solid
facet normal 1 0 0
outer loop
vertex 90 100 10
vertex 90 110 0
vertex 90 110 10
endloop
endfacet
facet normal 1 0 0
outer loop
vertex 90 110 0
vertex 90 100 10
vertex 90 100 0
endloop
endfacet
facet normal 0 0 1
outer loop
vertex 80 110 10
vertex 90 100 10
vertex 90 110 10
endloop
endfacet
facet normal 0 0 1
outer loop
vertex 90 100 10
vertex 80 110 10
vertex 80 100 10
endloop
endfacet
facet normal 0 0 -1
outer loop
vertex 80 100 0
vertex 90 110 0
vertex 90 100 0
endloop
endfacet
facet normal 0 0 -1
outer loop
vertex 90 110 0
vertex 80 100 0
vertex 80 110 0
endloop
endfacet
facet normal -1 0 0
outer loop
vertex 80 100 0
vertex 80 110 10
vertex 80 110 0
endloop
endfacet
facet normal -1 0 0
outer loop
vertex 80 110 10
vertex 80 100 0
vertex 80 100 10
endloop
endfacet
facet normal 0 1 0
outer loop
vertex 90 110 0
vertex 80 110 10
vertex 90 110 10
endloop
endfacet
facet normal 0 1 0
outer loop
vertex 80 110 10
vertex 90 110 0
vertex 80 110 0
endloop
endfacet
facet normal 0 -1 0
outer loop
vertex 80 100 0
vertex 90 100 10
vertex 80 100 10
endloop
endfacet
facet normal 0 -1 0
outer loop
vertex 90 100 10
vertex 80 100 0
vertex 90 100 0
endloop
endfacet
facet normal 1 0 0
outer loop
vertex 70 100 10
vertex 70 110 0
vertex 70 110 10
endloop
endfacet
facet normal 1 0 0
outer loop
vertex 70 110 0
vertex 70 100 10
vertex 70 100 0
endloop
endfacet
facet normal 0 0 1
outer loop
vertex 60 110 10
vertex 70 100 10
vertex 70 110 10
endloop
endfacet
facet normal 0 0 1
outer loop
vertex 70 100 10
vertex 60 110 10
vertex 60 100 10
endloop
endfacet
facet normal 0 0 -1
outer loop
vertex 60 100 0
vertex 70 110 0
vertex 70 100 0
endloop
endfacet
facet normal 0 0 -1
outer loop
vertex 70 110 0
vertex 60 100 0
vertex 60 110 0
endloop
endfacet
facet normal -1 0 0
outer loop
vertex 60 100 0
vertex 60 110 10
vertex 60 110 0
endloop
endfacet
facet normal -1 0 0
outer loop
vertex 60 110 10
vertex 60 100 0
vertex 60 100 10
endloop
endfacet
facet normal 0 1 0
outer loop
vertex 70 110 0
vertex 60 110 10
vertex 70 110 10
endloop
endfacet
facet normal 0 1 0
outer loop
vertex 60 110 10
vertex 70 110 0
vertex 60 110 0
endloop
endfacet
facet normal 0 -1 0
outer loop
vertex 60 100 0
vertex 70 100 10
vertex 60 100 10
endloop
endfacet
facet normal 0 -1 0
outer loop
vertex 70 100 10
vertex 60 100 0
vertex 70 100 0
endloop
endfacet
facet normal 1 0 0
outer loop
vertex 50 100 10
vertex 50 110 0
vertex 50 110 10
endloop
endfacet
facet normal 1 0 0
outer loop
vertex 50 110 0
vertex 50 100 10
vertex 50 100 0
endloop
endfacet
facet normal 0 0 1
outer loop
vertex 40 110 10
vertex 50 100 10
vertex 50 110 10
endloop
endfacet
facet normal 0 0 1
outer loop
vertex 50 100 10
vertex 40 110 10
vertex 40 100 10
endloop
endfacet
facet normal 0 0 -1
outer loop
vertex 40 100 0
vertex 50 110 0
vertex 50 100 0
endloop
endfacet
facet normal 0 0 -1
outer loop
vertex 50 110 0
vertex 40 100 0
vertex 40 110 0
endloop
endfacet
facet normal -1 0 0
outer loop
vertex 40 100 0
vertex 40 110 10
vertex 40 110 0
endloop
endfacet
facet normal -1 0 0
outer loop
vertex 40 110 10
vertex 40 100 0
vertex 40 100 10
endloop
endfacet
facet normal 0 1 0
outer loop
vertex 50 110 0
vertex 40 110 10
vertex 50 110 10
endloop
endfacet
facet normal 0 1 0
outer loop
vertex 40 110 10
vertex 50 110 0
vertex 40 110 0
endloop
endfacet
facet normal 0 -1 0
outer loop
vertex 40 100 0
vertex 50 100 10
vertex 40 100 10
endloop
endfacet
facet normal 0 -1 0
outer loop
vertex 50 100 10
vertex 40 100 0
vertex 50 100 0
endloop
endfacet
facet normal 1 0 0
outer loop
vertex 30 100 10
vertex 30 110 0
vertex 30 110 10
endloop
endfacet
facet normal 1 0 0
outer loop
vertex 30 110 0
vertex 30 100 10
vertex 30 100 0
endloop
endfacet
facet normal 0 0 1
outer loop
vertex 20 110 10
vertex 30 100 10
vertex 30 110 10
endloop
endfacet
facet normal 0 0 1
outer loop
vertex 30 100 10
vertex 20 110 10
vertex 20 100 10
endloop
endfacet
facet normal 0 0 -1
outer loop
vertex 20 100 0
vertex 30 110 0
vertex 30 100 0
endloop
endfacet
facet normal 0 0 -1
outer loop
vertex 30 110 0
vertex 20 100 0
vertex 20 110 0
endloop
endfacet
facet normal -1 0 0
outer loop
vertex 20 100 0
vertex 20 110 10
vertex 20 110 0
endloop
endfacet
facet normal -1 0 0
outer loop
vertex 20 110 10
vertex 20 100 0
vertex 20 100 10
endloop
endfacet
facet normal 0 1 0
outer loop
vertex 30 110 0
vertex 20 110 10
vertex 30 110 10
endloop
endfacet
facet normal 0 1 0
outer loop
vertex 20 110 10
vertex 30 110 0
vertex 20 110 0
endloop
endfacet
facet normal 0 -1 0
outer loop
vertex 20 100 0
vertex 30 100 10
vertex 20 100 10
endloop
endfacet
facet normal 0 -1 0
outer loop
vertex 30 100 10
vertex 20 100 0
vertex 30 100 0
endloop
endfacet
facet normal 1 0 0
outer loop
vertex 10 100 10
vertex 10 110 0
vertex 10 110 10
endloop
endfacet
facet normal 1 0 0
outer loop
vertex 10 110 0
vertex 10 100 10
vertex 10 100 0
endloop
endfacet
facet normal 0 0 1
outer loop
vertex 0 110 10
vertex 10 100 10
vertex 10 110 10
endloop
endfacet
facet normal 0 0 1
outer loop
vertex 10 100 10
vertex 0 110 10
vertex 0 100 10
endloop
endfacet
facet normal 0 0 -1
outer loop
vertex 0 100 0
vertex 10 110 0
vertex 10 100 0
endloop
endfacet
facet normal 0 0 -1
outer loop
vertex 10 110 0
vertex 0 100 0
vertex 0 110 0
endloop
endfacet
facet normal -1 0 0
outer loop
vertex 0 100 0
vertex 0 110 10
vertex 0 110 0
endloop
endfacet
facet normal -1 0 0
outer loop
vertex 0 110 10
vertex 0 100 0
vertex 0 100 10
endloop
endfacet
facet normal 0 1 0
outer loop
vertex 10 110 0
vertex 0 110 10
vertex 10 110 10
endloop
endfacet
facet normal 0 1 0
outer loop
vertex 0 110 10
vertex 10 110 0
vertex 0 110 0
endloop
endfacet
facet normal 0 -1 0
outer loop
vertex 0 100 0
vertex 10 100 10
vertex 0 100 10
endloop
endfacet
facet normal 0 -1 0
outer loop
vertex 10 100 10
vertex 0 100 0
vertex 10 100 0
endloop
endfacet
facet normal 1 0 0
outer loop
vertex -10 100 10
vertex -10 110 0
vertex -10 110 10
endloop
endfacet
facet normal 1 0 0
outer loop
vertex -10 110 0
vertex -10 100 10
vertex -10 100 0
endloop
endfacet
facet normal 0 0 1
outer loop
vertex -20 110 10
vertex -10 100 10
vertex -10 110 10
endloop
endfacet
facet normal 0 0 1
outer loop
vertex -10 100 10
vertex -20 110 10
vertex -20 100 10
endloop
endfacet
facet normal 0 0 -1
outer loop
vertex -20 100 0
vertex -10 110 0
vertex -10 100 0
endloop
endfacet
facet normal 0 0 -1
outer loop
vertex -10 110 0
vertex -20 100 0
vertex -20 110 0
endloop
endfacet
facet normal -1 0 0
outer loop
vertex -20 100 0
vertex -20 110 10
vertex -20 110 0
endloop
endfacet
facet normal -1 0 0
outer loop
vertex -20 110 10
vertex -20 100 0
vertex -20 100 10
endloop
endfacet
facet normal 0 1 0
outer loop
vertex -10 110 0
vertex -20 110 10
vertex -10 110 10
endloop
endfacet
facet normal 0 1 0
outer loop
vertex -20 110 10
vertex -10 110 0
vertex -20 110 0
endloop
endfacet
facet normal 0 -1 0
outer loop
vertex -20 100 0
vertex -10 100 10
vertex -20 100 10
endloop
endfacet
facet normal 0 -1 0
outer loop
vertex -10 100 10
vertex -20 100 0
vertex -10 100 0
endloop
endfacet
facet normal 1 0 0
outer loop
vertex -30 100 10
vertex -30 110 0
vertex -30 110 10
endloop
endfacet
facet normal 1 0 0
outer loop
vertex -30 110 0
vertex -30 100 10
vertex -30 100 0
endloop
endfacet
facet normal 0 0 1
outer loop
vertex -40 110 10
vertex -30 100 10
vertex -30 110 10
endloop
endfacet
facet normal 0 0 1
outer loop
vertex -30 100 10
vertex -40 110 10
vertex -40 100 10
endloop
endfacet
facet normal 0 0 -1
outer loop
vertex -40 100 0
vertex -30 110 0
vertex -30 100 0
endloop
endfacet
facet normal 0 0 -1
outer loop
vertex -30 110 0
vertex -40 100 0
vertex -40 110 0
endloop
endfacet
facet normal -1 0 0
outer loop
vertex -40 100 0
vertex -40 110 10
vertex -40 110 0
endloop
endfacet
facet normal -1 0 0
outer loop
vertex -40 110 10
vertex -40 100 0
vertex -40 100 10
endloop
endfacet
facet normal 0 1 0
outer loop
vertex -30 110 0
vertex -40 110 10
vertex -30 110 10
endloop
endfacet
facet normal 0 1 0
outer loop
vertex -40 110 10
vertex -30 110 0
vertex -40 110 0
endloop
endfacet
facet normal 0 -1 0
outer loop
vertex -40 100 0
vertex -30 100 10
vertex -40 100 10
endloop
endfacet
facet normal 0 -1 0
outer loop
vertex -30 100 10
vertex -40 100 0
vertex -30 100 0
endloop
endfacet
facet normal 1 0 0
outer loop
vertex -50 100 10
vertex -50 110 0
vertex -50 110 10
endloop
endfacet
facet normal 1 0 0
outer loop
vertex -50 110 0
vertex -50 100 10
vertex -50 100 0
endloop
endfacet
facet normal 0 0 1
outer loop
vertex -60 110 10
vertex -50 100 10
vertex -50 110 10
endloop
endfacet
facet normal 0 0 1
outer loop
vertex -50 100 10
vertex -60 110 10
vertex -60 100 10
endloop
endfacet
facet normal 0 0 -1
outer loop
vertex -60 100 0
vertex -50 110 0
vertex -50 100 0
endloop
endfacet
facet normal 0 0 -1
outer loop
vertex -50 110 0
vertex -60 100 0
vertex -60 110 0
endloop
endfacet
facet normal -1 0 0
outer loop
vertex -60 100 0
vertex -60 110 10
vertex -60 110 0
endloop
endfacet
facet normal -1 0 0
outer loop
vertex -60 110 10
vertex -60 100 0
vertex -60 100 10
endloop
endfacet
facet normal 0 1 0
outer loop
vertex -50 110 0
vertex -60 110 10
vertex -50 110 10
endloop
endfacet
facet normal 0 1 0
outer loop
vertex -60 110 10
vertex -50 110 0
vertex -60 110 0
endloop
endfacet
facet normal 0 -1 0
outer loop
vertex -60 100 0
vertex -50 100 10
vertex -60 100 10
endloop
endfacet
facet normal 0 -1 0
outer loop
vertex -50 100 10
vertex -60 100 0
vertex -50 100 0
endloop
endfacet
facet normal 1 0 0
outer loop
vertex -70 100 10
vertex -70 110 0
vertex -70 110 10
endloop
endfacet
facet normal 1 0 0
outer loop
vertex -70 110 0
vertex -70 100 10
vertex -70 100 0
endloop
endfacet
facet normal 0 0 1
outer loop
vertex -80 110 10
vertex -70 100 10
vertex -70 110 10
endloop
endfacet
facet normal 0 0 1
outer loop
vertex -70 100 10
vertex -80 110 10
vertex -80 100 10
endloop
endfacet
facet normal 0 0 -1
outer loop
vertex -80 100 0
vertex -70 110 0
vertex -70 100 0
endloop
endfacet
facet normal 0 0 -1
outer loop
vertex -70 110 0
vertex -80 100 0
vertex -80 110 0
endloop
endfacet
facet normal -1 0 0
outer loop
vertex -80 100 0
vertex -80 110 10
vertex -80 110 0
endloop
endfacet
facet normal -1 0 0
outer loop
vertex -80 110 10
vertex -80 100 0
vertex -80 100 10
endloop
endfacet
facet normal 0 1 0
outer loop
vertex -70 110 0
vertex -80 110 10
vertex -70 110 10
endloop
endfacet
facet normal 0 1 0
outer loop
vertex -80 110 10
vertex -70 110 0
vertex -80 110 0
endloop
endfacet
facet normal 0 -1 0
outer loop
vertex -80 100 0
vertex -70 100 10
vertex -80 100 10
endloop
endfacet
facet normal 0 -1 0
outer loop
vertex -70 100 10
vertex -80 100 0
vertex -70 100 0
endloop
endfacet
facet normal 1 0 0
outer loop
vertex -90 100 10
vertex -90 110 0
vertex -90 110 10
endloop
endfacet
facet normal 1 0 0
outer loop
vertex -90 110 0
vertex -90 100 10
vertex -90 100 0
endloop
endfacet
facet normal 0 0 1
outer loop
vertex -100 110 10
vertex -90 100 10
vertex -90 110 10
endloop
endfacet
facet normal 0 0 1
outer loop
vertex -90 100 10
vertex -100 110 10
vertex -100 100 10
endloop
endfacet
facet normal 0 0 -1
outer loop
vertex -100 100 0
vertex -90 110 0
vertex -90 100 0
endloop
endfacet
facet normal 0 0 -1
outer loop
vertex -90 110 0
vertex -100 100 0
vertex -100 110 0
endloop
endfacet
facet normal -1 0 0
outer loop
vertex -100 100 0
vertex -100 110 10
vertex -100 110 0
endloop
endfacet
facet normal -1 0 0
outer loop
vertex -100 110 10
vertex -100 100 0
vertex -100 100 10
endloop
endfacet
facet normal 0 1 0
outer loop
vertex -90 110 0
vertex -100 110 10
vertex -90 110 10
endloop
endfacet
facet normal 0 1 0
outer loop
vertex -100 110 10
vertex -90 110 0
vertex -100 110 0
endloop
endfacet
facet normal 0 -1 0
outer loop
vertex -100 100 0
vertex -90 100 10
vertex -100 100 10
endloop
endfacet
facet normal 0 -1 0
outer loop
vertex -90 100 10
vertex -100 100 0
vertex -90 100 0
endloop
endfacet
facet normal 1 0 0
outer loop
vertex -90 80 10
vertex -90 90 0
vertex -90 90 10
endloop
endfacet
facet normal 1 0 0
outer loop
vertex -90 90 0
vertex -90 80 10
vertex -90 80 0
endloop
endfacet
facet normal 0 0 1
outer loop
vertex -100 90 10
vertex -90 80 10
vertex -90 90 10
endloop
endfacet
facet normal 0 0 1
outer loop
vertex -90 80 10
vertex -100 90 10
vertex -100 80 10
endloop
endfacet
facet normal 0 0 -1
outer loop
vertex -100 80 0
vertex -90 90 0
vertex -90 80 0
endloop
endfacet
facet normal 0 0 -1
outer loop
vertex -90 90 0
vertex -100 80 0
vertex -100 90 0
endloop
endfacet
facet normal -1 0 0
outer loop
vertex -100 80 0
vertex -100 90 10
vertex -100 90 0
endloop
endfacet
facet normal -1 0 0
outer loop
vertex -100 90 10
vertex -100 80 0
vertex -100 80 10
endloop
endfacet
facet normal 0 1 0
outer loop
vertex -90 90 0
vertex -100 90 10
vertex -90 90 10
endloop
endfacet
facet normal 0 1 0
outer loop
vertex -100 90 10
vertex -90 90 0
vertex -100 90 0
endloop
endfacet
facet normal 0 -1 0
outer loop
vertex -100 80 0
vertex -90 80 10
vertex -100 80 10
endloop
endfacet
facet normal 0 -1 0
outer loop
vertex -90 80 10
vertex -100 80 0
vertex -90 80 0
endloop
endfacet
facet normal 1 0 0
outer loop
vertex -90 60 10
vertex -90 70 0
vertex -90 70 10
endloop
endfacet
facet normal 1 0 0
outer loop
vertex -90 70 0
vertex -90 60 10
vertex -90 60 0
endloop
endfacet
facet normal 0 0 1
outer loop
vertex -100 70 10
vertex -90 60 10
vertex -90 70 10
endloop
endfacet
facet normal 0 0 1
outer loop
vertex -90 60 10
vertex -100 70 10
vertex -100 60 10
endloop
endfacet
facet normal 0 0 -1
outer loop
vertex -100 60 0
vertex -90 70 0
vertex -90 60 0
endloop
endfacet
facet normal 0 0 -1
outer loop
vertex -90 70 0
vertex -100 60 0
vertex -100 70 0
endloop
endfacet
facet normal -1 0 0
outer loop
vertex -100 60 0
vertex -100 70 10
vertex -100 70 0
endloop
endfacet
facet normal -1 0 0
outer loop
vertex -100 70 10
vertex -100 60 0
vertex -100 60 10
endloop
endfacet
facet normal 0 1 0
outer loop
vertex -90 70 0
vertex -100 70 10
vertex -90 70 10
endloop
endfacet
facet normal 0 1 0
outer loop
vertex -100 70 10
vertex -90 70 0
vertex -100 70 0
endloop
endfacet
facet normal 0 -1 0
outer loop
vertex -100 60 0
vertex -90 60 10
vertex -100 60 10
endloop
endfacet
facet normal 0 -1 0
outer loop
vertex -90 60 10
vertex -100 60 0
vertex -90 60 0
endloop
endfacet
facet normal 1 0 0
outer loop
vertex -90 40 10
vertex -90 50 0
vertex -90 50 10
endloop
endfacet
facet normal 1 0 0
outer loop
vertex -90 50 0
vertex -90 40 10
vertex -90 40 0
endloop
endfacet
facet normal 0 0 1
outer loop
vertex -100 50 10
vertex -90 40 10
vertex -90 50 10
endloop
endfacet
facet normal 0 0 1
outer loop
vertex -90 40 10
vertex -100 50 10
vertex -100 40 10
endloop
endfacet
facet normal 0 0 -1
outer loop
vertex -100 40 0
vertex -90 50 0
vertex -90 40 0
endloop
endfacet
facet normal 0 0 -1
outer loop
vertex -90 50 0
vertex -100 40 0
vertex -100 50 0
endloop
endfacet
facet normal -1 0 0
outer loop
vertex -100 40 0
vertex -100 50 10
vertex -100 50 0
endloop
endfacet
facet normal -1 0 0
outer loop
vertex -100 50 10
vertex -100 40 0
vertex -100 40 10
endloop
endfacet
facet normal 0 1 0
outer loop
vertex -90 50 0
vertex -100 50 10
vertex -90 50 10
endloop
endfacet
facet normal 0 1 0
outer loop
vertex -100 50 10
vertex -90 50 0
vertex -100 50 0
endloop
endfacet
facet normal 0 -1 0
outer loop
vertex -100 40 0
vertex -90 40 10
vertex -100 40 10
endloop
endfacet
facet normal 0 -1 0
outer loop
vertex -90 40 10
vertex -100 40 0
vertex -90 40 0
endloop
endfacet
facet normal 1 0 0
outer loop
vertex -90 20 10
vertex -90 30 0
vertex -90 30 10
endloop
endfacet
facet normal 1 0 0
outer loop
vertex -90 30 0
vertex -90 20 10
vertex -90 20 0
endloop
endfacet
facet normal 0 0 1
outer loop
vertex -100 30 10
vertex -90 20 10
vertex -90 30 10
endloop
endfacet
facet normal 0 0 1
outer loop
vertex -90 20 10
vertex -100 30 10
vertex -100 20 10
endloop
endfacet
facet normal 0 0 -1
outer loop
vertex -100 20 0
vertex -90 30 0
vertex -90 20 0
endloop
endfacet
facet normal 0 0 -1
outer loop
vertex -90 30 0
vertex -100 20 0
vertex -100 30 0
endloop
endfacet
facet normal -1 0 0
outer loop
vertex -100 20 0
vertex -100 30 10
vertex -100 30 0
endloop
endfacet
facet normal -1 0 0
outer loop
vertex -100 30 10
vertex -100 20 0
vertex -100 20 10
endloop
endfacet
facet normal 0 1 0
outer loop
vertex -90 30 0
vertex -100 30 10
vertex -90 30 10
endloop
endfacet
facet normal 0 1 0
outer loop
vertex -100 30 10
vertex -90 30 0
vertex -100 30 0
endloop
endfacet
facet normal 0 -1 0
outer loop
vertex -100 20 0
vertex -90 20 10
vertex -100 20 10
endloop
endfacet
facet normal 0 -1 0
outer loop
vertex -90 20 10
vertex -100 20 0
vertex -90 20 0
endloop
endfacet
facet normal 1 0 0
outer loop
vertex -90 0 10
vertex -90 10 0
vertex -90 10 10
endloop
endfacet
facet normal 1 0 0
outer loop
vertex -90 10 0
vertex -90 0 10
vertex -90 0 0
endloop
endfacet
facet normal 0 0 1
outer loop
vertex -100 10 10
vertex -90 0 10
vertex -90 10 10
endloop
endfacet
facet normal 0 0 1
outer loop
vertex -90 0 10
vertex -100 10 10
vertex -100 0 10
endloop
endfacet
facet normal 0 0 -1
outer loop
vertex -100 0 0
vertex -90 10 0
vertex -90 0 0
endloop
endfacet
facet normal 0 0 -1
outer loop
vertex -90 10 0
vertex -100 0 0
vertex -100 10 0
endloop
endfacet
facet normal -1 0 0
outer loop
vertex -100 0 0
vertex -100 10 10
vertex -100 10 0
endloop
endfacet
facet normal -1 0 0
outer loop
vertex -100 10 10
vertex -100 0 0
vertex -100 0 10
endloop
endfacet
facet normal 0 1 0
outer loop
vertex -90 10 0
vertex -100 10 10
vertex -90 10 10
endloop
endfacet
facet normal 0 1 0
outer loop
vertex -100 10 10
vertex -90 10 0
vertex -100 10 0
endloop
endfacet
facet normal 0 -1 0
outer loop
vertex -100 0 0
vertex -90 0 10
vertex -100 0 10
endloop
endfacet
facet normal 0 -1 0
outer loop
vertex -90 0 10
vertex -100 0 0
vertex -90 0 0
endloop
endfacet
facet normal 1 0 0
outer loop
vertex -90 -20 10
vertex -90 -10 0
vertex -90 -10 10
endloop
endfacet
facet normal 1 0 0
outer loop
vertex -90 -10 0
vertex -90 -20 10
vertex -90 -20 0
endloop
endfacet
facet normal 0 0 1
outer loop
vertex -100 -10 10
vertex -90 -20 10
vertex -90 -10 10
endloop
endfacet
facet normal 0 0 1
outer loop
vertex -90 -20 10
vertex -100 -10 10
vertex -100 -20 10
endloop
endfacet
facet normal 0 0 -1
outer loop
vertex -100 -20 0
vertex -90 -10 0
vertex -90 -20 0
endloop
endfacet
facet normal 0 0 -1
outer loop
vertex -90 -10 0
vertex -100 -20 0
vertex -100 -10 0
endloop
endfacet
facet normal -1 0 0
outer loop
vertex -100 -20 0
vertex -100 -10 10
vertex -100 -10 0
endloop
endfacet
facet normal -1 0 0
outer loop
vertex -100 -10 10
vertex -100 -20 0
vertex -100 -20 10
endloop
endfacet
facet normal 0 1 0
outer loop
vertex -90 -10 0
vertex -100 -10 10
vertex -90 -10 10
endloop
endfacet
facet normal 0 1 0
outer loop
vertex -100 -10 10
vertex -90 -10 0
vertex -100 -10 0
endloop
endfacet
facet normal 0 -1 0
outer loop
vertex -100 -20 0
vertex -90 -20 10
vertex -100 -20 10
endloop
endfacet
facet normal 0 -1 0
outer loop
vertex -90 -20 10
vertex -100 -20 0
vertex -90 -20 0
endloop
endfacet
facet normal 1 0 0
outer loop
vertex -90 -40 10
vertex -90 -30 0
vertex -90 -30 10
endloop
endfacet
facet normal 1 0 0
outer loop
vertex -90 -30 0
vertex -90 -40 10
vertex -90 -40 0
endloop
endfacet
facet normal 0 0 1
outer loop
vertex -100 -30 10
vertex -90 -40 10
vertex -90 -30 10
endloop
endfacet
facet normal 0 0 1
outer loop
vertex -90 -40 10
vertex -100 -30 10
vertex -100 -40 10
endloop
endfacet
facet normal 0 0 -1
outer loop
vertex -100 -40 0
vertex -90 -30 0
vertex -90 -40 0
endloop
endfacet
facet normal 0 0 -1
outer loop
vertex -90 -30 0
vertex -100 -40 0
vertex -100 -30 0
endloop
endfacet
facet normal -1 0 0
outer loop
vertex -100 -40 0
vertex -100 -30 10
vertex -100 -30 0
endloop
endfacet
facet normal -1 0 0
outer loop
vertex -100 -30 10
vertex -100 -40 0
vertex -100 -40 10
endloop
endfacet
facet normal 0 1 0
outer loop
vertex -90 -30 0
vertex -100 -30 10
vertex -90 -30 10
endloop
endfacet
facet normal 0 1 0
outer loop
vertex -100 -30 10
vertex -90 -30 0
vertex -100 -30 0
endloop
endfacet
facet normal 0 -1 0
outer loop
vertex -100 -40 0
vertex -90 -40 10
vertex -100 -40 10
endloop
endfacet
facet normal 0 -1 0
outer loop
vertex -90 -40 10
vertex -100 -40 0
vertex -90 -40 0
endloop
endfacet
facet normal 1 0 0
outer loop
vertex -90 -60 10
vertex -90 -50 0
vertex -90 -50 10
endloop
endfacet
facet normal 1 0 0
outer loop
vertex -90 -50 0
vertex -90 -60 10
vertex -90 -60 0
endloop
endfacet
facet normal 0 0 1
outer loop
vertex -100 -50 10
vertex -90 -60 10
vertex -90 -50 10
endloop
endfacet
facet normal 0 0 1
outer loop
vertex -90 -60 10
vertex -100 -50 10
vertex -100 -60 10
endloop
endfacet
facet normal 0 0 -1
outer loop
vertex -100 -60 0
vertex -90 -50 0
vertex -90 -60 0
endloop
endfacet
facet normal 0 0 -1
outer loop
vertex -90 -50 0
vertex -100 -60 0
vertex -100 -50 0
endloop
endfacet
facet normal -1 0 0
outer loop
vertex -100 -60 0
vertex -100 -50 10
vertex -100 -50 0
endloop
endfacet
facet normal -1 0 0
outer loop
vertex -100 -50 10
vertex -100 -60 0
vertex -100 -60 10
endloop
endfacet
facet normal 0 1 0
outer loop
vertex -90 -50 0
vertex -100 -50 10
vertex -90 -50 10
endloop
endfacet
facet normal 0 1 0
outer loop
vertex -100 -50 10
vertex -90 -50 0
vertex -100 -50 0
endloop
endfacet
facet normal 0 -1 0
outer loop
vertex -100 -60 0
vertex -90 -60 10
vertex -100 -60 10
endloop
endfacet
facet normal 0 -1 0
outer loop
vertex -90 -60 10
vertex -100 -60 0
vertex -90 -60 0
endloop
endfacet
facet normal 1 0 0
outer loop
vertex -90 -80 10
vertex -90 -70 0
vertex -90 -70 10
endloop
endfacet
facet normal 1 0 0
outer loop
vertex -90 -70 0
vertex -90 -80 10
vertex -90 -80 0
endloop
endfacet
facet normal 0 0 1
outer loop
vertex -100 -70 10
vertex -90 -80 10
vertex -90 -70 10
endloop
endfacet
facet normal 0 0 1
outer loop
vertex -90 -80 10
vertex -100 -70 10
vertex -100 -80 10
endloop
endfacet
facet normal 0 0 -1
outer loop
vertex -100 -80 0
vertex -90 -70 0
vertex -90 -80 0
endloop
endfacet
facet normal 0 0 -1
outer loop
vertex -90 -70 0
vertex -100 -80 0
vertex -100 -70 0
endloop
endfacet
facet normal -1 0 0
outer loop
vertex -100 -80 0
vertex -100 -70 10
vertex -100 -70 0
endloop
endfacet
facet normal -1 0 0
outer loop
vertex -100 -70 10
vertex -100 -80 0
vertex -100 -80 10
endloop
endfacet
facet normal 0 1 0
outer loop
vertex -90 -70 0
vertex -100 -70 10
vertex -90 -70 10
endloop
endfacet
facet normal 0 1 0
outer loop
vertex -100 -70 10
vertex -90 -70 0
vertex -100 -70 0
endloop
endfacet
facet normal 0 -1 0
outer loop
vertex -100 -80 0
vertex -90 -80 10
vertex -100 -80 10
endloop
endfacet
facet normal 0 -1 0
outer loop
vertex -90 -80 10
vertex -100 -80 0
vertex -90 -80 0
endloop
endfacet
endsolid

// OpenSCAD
module square_spiral (side)
{
}

module side (x,y,z,offset_x, offset_y, steps)
{
    for (i=[1:steps])
    {
        translate ([x+i*offset_x,y+i*offset_y,z]) cube (10,10,1);
    }
}

side (100,100,0,-20,0,10);
side (-100,100,0,0,-20,9);

        
